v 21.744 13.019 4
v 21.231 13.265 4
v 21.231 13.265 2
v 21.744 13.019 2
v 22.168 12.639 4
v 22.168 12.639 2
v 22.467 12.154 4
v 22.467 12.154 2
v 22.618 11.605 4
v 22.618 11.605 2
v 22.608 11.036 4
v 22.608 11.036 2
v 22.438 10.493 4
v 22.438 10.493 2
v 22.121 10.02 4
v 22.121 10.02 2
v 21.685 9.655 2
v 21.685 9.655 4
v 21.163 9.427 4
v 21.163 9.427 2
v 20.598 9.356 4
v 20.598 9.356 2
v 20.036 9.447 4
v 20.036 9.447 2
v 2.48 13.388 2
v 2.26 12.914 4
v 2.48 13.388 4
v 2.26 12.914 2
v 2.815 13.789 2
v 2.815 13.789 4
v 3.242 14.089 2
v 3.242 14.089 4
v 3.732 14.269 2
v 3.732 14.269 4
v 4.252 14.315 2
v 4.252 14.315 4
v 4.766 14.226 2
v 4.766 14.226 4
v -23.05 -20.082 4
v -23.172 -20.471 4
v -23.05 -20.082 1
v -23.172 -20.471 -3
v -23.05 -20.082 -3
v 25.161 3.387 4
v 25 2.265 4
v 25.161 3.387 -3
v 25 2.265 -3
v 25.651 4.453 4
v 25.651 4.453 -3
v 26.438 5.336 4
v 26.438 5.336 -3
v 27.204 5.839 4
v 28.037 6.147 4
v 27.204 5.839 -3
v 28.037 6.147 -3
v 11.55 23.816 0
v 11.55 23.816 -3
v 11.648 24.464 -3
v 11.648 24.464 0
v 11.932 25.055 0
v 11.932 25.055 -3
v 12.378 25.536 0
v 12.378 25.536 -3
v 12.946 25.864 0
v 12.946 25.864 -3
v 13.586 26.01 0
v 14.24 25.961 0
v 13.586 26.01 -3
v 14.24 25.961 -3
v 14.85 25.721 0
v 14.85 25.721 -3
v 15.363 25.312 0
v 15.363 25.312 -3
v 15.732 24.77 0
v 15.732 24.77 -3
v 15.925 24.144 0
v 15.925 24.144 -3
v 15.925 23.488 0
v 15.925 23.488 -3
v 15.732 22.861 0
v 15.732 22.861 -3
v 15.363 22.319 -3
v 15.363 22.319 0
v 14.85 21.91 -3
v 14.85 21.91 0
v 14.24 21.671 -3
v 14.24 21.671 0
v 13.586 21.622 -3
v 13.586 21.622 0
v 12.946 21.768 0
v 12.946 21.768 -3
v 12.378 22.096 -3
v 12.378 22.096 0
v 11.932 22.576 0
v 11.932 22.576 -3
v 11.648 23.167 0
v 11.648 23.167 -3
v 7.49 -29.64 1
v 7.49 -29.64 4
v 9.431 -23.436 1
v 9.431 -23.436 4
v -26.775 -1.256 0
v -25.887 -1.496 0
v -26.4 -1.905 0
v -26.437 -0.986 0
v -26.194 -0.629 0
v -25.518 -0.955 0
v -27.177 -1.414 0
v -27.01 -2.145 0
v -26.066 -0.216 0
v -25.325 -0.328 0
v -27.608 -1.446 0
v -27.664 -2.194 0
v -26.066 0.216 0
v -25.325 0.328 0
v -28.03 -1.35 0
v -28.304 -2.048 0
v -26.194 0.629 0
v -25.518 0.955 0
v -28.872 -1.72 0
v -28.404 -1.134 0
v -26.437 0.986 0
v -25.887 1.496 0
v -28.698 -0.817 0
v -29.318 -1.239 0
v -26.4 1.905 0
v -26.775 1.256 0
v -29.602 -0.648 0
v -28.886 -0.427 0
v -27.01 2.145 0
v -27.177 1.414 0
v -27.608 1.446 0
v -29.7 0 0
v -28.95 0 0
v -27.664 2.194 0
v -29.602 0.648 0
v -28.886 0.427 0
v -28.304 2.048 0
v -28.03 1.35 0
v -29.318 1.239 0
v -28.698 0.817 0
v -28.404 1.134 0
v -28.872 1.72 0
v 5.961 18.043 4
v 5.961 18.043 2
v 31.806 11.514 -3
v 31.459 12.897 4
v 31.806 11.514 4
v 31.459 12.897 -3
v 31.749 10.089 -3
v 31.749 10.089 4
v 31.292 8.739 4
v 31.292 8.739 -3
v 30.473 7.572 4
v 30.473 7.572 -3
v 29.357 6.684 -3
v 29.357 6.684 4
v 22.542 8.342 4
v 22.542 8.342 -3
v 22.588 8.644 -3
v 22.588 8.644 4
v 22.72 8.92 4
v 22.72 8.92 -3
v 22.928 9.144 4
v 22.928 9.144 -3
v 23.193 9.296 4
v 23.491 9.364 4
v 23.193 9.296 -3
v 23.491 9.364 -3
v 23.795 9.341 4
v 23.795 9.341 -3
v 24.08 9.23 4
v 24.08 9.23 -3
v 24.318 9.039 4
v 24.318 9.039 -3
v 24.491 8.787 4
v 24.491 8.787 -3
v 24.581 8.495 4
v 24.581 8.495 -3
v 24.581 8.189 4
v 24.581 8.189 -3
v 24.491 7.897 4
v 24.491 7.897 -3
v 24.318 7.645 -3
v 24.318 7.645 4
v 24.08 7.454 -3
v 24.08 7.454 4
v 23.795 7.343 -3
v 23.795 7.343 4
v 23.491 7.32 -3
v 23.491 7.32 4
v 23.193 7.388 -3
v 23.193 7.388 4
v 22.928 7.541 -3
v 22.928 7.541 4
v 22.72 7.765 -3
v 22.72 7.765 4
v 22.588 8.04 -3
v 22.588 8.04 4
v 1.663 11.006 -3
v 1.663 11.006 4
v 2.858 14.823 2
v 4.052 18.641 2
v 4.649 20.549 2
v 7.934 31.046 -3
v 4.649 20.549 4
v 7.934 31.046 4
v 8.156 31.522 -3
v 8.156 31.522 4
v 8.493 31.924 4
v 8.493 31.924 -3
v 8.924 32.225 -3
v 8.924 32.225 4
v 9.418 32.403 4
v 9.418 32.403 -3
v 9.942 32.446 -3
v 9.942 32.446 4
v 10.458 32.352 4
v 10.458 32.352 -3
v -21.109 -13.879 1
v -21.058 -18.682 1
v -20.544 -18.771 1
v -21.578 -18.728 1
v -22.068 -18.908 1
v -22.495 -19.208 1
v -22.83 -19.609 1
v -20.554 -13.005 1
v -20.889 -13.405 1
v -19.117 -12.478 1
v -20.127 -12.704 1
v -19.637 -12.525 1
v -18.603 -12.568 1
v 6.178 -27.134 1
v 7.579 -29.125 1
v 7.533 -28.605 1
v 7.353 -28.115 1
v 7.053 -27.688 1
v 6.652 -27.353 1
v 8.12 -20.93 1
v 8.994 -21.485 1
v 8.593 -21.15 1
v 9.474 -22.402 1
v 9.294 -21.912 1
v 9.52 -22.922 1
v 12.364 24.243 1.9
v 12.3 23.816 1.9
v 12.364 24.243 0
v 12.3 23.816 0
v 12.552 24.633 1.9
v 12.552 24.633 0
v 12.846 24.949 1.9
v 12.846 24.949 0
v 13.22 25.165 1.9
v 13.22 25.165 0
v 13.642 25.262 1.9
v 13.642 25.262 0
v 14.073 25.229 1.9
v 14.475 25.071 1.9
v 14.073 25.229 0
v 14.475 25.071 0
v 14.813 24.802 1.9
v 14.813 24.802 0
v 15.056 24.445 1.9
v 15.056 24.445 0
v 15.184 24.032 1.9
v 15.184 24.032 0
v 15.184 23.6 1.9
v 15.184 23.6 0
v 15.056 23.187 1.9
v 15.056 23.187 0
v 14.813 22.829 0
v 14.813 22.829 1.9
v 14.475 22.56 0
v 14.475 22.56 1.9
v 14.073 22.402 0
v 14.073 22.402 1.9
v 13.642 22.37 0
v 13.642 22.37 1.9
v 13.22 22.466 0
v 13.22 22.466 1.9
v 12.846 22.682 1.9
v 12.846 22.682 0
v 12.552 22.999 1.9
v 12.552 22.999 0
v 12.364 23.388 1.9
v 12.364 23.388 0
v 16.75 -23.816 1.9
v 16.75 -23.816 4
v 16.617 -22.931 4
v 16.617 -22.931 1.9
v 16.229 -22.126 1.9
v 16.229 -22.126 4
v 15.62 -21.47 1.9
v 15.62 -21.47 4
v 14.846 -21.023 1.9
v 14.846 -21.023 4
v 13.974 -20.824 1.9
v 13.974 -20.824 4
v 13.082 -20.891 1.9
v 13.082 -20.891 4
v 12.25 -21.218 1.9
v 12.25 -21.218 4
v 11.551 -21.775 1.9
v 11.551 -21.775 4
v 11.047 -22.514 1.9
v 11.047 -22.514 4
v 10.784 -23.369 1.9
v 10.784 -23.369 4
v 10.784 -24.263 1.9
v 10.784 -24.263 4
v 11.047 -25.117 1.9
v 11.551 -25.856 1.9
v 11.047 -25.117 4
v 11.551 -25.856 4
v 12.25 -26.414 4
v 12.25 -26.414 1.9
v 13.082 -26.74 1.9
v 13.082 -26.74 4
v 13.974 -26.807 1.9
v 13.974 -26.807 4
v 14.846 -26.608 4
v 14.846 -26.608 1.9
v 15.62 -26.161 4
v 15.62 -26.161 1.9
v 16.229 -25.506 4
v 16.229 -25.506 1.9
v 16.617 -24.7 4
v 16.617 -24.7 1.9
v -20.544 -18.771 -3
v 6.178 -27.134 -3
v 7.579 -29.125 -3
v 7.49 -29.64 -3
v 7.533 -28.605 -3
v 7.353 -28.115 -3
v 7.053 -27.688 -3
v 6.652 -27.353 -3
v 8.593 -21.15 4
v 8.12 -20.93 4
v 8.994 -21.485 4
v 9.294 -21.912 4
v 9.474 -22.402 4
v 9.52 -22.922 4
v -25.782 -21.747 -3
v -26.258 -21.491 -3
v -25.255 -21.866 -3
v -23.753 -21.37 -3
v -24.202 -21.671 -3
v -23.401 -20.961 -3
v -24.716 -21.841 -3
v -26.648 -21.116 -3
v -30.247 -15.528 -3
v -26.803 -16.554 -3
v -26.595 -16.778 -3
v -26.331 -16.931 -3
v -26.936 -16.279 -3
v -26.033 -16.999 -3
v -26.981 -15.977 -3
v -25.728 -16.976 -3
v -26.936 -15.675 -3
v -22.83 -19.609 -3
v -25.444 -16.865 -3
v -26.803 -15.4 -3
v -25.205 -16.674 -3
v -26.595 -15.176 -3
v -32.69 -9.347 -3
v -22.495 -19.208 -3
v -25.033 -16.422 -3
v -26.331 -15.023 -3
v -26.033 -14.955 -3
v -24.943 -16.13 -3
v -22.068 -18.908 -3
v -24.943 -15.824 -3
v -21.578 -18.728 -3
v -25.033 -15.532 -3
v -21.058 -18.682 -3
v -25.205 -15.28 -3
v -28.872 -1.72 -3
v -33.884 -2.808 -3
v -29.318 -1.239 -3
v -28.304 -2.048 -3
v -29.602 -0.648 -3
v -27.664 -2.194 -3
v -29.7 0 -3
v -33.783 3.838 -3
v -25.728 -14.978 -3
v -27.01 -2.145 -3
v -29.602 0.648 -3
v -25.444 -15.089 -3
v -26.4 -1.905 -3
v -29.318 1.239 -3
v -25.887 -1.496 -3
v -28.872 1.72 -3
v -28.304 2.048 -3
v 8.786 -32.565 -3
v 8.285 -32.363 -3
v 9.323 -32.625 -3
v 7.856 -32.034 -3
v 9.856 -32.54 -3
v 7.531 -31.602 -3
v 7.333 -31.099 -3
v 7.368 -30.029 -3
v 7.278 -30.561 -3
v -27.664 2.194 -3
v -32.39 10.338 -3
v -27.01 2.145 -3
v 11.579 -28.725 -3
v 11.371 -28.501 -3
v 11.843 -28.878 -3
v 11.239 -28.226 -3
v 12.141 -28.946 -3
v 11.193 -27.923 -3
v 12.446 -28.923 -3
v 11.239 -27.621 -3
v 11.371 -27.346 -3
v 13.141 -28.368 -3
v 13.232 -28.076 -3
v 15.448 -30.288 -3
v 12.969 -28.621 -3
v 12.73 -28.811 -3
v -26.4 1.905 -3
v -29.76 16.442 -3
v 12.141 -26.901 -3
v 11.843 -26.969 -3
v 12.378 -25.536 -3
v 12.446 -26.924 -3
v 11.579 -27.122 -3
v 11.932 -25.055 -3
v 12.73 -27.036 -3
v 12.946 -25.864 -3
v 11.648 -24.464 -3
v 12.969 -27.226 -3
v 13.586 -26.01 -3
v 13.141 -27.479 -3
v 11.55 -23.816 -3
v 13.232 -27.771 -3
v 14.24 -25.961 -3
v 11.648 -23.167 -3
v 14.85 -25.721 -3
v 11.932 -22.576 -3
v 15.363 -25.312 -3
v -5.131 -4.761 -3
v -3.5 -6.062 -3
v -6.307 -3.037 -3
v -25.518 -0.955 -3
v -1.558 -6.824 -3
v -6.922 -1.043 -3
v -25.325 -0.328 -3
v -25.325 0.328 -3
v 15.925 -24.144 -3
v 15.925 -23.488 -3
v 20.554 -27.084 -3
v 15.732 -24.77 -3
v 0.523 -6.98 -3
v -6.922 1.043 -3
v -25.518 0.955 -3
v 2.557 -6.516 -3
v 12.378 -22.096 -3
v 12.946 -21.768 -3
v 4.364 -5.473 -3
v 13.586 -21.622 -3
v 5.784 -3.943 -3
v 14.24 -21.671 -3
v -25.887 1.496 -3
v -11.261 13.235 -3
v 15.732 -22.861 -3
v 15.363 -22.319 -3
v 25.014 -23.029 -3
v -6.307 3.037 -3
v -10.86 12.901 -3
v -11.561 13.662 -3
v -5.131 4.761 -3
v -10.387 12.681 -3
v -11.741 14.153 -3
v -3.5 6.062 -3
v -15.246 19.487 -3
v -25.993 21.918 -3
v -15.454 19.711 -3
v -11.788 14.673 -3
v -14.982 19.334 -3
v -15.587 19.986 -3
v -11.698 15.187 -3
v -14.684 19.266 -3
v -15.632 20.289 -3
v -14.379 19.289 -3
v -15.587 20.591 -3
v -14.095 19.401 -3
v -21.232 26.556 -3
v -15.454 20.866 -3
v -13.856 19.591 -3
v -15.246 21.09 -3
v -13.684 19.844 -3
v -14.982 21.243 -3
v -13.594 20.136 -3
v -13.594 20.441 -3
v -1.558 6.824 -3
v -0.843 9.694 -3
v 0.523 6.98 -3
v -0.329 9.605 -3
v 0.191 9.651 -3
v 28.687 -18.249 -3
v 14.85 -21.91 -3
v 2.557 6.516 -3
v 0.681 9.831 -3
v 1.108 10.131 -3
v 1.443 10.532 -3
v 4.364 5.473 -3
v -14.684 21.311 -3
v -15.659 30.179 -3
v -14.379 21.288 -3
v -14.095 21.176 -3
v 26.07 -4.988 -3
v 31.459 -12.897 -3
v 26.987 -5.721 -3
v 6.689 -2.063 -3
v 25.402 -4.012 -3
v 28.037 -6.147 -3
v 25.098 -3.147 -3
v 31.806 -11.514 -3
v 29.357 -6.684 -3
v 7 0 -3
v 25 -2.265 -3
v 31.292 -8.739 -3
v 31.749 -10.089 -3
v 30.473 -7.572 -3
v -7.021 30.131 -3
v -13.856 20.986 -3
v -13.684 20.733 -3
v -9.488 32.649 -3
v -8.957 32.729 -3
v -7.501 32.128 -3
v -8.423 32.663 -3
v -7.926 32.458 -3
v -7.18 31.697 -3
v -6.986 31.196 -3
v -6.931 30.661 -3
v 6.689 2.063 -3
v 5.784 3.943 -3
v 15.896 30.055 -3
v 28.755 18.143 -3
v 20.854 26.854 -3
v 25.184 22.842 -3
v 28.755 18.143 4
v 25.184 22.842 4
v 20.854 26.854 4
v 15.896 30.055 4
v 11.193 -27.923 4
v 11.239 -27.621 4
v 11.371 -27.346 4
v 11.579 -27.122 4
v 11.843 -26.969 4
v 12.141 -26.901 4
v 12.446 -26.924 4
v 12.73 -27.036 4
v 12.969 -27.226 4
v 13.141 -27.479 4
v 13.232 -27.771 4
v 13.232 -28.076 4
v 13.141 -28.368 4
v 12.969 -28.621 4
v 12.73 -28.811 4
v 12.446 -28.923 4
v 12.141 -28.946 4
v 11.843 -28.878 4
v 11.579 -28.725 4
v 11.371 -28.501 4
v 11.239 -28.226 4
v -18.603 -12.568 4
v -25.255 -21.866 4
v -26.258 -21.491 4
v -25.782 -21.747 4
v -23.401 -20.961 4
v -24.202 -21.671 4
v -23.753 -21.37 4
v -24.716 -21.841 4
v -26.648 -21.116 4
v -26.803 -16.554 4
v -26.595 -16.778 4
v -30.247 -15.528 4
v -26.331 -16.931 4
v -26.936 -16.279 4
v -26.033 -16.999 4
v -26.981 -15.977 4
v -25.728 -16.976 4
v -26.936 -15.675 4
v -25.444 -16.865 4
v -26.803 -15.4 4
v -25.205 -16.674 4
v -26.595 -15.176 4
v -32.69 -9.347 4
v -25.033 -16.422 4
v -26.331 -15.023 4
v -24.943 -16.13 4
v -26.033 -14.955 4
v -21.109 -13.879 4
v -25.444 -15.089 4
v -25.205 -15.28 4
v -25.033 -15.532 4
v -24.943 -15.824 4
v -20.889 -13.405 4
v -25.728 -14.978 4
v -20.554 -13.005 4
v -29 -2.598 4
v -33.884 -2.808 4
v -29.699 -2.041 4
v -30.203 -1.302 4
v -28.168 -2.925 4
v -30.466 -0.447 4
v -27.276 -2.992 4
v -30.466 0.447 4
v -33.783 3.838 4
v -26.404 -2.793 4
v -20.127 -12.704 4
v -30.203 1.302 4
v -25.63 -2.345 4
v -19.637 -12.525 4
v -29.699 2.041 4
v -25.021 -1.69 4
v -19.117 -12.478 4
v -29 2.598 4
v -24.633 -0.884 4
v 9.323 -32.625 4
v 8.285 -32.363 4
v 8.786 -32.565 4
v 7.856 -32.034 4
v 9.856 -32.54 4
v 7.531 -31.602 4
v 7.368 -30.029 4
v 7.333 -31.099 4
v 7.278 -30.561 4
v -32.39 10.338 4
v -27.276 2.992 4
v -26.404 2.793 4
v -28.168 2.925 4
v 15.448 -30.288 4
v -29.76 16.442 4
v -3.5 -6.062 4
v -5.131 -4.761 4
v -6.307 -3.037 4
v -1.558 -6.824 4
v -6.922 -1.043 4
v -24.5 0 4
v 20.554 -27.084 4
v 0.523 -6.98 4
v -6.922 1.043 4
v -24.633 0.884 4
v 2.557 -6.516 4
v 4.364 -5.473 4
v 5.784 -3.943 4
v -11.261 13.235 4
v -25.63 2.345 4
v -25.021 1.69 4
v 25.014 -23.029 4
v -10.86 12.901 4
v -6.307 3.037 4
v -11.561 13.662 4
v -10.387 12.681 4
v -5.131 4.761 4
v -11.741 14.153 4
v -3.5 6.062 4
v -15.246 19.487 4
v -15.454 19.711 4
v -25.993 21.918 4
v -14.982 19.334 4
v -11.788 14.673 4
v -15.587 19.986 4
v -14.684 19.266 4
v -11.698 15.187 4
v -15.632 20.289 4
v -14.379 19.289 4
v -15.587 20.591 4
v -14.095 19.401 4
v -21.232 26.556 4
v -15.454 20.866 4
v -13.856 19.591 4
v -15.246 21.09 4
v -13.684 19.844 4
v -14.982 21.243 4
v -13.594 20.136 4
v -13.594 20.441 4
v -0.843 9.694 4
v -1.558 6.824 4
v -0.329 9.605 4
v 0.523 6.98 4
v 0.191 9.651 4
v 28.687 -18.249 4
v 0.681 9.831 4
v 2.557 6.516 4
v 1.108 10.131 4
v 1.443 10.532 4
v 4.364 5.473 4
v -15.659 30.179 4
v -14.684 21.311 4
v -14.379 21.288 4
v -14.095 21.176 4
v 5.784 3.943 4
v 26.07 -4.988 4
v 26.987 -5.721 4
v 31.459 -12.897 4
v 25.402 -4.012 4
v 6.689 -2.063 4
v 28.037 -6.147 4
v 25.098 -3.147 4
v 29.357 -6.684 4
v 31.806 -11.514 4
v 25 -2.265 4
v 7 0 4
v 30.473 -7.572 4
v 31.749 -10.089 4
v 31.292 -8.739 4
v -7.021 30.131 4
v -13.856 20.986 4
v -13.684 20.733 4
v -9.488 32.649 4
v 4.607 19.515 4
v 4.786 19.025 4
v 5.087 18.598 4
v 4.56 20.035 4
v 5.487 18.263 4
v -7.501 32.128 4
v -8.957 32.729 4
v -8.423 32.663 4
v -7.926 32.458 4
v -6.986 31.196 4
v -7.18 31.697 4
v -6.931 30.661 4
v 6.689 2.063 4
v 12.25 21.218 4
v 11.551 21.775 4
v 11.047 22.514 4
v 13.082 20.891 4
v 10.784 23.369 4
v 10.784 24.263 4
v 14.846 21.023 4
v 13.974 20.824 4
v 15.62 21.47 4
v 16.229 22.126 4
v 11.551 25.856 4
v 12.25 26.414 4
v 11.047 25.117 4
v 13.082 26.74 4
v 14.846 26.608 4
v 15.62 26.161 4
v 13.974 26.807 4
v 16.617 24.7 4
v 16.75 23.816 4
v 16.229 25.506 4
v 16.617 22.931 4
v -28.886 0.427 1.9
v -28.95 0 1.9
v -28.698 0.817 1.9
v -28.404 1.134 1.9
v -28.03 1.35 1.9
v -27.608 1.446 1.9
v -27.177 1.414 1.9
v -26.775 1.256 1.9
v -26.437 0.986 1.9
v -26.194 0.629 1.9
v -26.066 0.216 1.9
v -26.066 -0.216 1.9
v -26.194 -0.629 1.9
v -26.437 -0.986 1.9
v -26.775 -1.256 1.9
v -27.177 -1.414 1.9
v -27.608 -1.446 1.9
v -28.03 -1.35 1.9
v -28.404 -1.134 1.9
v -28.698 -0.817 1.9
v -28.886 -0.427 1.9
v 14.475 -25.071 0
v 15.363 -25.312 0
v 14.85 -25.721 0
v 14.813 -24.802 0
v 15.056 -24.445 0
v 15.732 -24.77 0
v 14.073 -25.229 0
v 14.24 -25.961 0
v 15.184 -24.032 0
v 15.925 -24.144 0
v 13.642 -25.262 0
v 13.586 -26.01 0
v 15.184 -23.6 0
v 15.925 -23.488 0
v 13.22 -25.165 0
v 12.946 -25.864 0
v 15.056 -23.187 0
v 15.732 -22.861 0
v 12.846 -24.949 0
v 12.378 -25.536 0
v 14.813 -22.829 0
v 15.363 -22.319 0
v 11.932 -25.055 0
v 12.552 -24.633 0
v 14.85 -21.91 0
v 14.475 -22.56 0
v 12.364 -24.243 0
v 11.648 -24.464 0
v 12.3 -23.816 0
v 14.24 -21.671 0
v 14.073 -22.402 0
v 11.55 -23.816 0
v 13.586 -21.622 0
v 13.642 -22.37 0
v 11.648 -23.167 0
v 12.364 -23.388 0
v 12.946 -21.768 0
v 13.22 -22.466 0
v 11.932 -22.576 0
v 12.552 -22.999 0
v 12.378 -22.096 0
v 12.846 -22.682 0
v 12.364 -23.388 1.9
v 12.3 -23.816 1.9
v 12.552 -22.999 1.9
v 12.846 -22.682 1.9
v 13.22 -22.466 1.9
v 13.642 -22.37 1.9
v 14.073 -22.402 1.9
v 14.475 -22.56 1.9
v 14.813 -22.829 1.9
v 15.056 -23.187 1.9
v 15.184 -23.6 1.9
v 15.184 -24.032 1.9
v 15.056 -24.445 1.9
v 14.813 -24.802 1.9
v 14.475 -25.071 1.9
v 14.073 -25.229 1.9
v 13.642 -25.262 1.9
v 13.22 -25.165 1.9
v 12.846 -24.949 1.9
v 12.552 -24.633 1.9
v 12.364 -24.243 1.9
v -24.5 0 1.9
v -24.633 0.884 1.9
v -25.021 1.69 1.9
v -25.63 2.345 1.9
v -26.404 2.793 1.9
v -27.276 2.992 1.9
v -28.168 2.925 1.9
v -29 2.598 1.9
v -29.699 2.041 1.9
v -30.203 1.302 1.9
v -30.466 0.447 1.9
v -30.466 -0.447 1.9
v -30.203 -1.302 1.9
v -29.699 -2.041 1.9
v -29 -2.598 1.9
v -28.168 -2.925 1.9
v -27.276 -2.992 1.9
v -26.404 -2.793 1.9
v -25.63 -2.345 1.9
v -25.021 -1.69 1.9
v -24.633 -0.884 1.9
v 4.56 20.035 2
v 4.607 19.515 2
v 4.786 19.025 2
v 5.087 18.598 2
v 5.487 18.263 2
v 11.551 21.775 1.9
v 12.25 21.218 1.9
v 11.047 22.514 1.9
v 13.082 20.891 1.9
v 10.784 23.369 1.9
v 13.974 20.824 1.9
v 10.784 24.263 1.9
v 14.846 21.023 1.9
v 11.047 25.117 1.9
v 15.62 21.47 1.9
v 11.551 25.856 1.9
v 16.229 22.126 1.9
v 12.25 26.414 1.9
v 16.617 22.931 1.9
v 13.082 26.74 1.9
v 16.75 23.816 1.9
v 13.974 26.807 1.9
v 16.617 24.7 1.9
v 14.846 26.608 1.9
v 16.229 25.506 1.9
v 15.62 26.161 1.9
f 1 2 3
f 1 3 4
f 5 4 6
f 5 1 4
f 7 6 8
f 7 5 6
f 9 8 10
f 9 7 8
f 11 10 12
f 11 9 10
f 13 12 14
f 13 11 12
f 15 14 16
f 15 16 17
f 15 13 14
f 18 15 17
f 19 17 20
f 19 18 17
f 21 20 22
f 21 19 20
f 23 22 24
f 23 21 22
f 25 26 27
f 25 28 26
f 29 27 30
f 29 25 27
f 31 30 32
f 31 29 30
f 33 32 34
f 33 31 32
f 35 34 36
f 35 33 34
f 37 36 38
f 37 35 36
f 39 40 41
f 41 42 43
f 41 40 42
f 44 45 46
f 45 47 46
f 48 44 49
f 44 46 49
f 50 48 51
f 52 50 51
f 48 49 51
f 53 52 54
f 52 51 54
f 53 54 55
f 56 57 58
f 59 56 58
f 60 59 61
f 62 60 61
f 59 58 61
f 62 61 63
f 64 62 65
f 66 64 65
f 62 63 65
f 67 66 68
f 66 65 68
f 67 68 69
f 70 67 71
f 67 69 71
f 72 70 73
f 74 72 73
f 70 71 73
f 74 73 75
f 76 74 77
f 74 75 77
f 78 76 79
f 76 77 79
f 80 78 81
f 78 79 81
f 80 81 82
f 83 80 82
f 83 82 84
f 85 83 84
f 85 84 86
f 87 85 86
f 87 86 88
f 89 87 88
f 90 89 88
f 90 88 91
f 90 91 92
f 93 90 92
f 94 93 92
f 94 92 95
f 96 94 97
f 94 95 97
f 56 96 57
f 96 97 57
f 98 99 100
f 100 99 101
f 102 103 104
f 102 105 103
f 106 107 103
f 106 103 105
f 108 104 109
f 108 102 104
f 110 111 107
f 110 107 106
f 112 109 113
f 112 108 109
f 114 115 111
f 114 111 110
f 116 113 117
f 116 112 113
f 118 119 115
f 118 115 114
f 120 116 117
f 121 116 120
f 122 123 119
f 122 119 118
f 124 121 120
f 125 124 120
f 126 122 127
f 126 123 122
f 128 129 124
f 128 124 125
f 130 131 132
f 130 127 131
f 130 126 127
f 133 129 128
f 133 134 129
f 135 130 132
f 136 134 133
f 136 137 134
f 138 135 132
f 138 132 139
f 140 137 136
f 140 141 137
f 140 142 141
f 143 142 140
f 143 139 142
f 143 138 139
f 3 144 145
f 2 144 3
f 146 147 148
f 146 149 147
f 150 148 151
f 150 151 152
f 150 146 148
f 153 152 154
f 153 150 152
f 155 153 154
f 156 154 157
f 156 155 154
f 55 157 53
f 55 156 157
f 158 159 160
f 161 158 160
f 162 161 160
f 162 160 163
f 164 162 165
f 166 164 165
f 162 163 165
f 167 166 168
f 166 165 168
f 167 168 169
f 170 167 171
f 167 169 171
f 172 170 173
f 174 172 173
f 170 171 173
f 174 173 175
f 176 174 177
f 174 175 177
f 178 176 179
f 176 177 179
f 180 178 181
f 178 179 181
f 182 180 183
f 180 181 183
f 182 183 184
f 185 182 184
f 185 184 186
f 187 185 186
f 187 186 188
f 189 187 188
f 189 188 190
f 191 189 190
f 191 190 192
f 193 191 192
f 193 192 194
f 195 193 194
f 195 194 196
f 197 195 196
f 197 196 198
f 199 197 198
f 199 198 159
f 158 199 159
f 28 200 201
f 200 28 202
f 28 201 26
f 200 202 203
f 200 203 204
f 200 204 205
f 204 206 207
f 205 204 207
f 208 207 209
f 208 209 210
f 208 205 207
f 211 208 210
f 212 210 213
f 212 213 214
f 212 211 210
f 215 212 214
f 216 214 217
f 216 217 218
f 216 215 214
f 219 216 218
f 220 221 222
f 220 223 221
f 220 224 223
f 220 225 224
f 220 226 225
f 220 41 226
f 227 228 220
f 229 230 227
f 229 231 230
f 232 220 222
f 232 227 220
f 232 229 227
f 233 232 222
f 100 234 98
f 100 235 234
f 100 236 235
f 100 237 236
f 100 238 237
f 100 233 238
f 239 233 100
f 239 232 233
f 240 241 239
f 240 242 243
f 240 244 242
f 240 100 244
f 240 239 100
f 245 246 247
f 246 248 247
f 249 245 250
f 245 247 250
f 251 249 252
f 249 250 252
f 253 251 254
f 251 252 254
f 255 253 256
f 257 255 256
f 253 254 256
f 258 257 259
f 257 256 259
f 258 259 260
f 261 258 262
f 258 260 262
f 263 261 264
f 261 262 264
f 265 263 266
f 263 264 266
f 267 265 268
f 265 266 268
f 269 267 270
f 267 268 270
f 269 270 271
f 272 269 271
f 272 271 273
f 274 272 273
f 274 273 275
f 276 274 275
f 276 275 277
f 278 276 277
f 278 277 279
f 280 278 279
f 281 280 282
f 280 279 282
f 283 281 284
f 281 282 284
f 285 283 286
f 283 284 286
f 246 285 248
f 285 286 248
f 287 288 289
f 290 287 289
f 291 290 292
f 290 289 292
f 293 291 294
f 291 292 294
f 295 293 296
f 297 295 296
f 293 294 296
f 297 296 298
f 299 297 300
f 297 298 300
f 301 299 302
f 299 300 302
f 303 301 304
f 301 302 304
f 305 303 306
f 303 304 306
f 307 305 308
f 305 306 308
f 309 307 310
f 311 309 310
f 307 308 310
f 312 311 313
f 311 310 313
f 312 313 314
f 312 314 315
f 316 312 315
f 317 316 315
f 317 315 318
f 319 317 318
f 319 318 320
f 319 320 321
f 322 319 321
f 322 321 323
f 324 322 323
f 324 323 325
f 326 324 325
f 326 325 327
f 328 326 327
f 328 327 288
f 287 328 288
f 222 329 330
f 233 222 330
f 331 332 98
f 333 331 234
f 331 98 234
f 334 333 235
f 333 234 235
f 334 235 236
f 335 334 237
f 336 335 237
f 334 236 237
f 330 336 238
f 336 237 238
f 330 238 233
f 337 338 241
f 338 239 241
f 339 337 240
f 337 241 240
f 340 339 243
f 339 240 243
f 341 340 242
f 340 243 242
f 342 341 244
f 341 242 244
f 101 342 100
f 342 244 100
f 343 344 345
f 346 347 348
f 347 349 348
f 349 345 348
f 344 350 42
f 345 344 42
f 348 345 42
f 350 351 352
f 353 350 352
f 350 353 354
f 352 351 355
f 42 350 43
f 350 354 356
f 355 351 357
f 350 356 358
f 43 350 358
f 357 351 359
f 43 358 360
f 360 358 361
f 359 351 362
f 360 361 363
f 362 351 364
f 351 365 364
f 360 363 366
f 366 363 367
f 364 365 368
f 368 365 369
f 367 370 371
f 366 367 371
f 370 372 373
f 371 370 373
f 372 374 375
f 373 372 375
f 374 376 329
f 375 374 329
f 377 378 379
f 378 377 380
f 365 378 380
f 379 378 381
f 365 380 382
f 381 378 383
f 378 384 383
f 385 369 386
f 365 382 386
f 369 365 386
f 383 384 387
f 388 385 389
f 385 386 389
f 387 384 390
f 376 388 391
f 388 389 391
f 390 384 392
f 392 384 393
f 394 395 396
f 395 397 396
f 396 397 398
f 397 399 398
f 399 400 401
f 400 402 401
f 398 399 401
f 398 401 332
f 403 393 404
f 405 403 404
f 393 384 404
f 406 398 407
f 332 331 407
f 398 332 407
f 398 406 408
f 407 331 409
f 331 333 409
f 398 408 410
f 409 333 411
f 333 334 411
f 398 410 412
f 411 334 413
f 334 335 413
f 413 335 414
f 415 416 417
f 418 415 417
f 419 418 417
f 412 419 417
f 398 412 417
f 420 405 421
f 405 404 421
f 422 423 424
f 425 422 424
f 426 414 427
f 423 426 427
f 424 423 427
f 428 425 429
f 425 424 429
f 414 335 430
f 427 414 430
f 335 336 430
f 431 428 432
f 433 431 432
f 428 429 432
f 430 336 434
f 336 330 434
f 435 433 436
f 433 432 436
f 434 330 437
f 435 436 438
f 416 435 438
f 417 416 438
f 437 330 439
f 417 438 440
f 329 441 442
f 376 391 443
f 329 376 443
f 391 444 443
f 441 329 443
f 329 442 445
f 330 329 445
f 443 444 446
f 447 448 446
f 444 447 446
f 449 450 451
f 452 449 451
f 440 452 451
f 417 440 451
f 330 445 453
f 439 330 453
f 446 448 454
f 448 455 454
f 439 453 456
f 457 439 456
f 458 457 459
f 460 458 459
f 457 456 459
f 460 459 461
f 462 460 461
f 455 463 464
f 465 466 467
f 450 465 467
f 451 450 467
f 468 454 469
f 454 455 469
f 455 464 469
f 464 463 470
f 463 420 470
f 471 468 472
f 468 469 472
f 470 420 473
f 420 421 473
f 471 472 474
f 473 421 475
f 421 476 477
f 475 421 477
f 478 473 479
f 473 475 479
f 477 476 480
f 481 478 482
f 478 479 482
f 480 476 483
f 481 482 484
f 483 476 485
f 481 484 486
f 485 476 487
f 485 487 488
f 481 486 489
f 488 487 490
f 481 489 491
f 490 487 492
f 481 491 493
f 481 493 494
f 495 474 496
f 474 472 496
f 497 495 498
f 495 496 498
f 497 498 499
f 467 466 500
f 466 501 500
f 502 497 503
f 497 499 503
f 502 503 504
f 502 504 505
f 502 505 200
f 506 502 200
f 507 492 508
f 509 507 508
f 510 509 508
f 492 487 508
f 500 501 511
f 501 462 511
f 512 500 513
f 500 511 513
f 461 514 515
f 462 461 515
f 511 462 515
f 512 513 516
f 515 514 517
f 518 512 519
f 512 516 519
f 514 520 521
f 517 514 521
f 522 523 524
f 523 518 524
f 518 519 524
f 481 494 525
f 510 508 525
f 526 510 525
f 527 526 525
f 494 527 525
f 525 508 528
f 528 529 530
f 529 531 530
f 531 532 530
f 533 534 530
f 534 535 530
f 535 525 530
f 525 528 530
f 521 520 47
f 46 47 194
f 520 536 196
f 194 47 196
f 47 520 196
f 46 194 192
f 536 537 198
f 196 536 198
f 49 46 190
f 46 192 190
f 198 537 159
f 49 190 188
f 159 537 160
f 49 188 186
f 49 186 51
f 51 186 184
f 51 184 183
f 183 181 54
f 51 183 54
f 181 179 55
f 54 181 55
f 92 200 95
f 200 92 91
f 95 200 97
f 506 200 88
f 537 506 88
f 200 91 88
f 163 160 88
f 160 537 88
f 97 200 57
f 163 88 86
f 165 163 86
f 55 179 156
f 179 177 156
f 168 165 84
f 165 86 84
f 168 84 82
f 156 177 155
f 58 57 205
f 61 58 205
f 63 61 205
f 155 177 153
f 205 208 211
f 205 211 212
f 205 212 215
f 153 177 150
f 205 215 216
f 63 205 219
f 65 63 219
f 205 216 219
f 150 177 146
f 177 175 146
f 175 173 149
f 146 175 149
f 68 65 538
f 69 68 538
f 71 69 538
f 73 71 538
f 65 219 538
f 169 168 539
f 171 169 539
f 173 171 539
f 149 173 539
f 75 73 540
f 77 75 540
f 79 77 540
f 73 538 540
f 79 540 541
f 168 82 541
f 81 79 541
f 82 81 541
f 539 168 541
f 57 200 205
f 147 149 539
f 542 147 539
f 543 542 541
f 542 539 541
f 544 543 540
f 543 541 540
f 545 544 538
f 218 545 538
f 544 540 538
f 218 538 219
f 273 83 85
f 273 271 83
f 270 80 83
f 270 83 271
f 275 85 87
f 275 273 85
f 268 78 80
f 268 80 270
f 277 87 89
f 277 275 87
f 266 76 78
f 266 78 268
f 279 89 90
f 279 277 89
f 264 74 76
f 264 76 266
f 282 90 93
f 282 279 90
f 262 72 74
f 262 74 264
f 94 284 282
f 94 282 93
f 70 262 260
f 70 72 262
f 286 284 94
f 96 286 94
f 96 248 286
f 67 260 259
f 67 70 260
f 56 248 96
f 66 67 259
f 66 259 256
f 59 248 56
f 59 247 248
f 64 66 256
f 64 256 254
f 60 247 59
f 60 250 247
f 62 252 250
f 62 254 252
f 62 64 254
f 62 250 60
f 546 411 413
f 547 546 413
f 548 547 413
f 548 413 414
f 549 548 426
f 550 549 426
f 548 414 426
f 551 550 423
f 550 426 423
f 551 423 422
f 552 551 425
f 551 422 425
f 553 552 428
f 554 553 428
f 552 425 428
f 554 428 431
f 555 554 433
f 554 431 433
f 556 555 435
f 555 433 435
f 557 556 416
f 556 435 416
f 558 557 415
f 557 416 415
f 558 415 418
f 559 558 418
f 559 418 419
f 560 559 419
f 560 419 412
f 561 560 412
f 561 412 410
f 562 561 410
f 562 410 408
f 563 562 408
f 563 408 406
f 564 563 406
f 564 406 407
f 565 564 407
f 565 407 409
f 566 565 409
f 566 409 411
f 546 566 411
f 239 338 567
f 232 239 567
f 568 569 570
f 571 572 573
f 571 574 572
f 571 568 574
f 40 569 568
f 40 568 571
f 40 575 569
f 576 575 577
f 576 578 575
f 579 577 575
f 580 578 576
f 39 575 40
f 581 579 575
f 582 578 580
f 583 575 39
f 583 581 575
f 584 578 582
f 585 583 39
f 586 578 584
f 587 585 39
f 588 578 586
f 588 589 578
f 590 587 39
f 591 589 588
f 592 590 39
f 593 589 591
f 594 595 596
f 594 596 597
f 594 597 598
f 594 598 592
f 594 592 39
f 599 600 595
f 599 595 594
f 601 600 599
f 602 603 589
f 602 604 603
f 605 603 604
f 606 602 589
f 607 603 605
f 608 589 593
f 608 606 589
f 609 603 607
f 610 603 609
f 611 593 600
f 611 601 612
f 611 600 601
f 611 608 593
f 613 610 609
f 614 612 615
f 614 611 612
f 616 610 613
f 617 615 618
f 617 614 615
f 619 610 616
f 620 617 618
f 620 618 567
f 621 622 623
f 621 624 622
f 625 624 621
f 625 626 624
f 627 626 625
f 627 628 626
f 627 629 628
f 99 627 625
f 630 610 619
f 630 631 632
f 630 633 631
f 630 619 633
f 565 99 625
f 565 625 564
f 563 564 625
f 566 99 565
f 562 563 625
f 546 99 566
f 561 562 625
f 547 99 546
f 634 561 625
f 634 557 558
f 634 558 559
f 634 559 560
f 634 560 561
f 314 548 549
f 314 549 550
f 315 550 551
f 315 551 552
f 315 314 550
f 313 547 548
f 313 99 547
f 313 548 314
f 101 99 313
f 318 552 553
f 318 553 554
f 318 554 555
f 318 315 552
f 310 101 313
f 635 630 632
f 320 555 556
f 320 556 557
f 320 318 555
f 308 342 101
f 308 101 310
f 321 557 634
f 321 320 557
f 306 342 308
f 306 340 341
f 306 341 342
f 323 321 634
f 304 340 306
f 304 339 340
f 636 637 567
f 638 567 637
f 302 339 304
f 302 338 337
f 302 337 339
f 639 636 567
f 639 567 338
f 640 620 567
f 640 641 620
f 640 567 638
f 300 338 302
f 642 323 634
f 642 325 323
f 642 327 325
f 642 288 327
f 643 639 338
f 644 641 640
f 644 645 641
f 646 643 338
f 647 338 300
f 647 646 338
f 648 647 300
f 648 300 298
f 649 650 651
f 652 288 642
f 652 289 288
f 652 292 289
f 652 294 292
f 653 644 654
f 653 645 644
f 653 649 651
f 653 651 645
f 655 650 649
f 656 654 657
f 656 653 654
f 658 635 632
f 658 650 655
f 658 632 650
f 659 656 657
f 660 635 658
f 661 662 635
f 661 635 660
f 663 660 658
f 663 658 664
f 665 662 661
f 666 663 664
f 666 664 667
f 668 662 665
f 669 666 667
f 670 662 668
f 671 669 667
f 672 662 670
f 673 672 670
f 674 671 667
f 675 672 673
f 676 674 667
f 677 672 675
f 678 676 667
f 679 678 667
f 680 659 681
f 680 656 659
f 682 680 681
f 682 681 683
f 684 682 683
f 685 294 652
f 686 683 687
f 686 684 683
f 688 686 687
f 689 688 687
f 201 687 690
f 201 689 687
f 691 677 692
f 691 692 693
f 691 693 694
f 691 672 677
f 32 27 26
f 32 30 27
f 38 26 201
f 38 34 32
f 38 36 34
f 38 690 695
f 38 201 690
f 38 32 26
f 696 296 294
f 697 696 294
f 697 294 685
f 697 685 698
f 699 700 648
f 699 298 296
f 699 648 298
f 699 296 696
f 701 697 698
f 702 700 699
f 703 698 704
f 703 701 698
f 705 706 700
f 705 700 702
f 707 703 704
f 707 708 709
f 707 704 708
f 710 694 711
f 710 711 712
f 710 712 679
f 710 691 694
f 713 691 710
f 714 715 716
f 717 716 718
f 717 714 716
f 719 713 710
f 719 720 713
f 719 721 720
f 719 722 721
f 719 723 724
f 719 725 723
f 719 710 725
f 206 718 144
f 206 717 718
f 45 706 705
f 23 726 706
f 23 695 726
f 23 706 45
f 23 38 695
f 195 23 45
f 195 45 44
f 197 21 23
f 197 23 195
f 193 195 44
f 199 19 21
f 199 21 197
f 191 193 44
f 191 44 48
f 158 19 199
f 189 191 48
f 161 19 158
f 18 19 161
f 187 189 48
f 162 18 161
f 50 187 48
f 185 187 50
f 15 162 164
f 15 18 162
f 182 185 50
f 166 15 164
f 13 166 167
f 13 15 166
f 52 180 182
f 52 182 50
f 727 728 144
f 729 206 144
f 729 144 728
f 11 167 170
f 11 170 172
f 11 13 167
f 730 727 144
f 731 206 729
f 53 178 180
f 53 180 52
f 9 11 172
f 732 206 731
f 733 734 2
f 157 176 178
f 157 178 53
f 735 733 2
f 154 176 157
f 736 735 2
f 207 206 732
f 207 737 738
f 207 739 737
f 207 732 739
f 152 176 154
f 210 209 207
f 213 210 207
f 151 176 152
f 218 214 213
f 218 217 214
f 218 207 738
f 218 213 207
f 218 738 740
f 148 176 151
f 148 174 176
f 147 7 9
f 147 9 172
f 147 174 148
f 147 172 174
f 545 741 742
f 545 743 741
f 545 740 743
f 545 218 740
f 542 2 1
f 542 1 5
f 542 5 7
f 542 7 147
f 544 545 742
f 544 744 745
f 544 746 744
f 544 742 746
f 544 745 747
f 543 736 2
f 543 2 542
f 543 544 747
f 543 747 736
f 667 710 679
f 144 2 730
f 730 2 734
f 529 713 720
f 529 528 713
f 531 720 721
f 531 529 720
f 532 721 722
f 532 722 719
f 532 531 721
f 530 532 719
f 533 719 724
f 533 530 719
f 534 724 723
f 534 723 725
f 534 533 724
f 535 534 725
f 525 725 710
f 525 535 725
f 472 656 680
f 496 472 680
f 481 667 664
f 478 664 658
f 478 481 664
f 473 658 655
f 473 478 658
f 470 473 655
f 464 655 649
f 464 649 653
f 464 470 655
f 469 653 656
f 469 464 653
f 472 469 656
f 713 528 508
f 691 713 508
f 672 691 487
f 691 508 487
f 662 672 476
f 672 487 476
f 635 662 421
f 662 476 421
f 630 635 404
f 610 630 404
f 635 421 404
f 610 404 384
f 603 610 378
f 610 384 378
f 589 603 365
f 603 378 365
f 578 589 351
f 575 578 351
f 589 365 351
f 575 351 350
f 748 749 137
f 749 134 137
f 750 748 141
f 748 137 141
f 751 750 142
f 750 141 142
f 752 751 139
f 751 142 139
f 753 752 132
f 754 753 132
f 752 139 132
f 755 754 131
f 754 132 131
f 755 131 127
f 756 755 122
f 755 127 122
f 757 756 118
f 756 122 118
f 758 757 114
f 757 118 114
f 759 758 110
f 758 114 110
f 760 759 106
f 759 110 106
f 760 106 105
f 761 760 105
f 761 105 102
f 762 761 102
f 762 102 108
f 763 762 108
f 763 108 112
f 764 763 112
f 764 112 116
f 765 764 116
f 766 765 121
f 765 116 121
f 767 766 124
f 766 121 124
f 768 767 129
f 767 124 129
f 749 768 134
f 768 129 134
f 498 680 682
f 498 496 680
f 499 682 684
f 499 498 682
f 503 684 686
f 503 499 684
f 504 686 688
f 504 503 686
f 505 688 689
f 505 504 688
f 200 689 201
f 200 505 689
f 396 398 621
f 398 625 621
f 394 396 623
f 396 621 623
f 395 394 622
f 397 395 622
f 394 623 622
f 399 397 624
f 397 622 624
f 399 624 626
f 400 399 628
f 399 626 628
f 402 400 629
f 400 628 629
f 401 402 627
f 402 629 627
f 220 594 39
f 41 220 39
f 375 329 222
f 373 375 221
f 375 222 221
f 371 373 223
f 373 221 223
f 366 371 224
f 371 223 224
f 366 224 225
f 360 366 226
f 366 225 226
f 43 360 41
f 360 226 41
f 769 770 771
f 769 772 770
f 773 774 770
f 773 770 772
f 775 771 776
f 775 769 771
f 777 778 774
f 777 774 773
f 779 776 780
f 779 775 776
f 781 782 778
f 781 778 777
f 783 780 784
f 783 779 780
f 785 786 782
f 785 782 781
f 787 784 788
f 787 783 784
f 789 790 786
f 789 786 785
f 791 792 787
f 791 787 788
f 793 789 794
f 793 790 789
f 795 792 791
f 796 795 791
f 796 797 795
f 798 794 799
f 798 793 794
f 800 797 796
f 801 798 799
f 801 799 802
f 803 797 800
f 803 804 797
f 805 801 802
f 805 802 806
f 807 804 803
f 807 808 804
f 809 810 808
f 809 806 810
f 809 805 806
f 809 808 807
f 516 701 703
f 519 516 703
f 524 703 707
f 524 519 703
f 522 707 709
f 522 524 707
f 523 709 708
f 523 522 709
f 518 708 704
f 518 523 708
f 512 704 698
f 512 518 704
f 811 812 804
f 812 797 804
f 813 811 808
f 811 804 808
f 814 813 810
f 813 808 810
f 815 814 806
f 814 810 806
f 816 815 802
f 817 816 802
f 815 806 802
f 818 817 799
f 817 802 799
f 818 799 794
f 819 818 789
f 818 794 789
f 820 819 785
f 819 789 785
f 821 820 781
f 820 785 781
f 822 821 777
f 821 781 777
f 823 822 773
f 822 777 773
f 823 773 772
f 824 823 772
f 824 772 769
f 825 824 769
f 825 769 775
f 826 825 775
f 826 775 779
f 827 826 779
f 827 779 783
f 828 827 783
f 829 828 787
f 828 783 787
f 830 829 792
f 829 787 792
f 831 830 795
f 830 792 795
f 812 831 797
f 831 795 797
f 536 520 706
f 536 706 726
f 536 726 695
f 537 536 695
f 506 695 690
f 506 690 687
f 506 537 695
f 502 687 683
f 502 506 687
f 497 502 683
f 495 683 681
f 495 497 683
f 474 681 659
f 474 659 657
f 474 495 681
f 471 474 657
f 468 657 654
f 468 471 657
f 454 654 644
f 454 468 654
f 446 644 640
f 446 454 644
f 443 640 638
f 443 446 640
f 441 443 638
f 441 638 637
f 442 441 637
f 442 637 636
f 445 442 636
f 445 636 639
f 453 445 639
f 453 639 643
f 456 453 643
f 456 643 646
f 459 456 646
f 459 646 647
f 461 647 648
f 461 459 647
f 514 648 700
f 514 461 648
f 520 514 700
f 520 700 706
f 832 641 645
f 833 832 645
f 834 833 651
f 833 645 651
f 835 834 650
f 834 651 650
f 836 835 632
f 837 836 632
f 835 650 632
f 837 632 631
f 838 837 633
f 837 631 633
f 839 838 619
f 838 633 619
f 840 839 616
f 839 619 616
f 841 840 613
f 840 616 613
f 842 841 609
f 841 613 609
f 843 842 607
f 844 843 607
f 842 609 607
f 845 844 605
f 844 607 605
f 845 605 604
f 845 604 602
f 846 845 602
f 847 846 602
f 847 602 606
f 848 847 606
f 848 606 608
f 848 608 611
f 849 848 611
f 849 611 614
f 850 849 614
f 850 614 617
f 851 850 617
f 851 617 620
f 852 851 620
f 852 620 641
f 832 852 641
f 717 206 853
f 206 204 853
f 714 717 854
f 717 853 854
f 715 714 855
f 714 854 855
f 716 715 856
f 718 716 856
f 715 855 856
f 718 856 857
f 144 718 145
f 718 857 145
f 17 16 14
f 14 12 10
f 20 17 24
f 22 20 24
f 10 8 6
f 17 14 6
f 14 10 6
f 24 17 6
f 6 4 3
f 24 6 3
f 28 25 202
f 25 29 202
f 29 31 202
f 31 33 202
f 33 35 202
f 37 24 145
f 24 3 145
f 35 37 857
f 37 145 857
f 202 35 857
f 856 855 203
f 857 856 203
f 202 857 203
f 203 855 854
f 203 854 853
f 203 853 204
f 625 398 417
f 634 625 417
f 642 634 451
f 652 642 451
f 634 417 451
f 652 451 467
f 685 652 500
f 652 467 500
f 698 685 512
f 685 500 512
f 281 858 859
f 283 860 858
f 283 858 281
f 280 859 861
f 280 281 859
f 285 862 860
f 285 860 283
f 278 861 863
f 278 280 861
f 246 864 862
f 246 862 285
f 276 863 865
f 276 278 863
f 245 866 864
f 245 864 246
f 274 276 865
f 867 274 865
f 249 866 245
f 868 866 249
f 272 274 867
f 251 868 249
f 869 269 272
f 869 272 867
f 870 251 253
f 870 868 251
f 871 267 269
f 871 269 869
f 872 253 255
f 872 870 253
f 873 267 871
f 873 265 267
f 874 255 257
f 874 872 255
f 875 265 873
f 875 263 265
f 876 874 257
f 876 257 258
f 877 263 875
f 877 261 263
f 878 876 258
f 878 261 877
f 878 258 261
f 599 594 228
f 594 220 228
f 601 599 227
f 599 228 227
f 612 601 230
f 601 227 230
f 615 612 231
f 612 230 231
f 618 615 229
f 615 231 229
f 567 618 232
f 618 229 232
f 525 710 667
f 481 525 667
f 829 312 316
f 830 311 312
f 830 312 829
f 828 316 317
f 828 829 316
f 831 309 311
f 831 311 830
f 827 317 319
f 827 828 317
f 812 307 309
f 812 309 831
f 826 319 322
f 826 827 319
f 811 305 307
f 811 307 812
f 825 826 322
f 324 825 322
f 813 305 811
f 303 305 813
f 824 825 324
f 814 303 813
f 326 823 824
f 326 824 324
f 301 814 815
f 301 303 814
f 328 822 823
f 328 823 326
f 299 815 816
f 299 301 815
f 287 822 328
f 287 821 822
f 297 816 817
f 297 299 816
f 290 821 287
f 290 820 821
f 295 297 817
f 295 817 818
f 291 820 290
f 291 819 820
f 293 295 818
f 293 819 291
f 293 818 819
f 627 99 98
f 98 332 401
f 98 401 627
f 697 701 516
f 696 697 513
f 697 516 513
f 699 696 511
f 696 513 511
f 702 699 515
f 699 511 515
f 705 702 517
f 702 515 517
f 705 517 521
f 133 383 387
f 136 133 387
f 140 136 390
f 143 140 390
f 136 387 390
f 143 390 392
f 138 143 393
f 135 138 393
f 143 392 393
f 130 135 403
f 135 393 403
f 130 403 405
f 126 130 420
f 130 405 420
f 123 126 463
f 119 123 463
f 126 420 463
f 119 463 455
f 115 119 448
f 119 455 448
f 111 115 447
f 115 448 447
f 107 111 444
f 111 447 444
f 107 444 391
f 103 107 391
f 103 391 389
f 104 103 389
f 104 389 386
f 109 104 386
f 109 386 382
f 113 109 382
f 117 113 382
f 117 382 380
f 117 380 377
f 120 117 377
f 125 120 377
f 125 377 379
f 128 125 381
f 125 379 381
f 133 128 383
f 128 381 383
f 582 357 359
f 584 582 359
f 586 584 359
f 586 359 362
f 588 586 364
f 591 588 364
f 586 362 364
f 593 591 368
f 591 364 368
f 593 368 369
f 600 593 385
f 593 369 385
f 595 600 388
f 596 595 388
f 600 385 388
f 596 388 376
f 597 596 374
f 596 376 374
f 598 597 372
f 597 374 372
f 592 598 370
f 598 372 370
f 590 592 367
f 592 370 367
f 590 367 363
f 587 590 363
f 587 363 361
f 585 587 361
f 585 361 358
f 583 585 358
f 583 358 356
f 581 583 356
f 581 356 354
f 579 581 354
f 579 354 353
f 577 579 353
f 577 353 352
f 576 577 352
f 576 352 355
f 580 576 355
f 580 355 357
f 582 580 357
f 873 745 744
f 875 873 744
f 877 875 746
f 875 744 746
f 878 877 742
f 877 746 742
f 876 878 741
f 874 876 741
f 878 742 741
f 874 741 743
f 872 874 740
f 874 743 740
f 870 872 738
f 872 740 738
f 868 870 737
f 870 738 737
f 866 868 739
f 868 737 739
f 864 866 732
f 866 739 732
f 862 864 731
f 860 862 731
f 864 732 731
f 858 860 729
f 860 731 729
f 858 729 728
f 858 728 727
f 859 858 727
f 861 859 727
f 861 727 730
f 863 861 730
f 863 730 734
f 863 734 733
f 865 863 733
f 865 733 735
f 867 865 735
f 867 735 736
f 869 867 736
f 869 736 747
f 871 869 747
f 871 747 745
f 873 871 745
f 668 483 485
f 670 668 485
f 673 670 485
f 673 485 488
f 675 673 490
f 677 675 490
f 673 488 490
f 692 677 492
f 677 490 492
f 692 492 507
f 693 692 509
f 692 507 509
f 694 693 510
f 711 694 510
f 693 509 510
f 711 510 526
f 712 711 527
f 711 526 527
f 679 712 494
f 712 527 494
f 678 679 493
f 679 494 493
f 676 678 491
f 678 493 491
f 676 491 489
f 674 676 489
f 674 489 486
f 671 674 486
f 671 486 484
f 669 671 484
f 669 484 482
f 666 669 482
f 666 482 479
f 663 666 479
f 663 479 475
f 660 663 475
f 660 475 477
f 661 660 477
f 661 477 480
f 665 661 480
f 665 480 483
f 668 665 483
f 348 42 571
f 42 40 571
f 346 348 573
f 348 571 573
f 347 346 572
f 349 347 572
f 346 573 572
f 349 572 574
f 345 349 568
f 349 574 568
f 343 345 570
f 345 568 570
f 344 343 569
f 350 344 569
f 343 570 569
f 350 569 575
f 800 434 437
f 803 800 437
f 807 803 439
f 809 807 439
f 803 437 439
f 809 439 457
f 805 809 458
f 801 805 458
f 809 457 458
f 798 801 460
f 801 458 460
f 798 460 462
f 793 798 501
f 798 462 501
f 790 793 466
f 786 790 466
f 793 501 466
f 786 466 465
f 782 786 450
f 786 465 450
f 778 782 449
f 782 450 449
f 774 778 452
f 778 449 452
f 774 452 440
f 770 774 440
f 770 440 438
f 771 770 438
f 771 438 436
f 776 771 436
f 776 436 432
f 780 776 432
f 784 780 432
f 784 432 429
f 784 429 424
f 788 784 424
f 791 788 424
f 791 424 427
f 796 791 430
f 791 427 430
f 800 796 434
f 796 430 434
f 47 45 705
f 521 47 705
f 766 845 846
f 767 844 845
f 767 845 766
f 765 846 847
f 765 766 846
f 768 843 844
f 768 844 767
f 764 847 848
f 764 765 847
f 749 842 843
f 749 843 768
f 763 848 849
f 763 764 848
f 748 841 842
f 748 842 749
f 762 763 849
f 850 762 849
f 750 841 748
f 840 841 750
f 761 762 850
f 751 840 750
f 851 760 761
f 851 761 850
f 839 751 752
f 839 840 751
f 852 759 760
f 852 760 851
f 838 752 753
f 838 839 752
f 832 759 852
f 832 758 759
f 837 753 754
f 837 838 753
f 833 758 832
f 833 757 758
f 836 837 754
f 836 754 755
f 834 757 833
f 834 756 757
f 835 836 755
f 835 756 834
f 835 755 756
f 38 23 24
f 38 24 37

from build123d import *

# Parameters (mm, degrees)
BOSS_EXTRUDE1_DEPTH                        = 4
BOSS_EXTRUDE1_DEPTH_BACK                   = 3
SKETCH1_R                                  = 34
SKETCH1_R_2                                = 1
SKETCH1_R_3                                = 7
CUT_EXTRUDE1_REACH                         = 50.59
CUT_EXTRUDE2_REACH                         = 50.744
FILLET1_R                                  = 5
FILLET2_R                                  = 4
M2_5X0_45_TAPPED_HOLE1_D                   = 2.05
CBORE_FOR_M2_5_PAN_HEAD_SCREW1_D           = 2.9
CBORE_FOR_M2_5_PAN_HEAD_SCREW1_DEPTH       = 7
CBORE_FOR_M2_5_PAN_HEAD_SCREW1_CBORE_D     = 6
CBORE_FOR_M2_5_PAN_HEAD_SCREW1_CBORE_DEPTH = 2.1
SKETCH13_R                                 = 2.2
CUT_EXTRUDE3_DEPTH                         = 3
CUT_EXTRUDE4_REACH                         = 50.59
FILLET3_R                                  = 2
CUT_EXTRUDE5_DEPTH                         = 3
FILLET4_R                                  = 2
CUT_EXTRUDE7_DEPTH                         = 2
FILLET5_R                                  = 2


with BuildPart() as part:
    # Sketch1 → Boss-Extrude1 (new, two sides: drawn at the far end of the back side and taken through both)
    with BuildSketch(Plane.XY.offset(-BOSS_EXTRUDE1_DEPTH_BACK)):
        Circle(SKETCH1_R)
        with Locations((-27.5, 0)):
            Circle(SKETCH1_R_2, mode=Mode.SUBTRACT)
        with Locations((13.75, 23.815698604)):
            Circle(SKETCH1_R_2, mode=Mode.SUBTRACT)
        with Locations((13.75, -23.815698604)):
            Circle(SKETCH1_R_2, mode=Mode.SUBTRACT)
        Circle(SKETCH1_R_3, mode=Mode.SUBTRACT)
    extrude(amount=BOSS_EXTRUDE1_DEPTH + BOSS_EXTRUDE1_DEPTH_BACK)

    # Sketch2 → Cut-Extrude1 (cut, up to next)
    with BuildSketch(Plane.XY.offset(4), mode=Mode.PRIVATE) as cut_extrude1_sk1:
        with BuildLine():
            Line((33.466401061, 6), (25, 6))
            Line((25, 6), (25, -6))
            Line((25, -6), (33.466401061, -6))
            ThreePointArc((33.466401061, -6), (34, 0), (33.466401061, 6))
        make_face()
    cut_extrude1_tool1 = extrude(cut_extrude1_sk1.sketch, amount=-CUT_EXTRUDE1_REACH, mode=Mode.PRIVATE) & part.part
    add(cut_extrude1_tool1.solids().sort_by_distance((29.412779, 0, 4))[0], mode=Mode.SUBTRACT)

    # Sketch4 → Cut-Extrude2 (cut, up to next)
    with BuildSketch(Plane.XY.offset(-4), mode=Mode.PRIVATE) as cut_extrude2_sk1:
        with BuildLine():
            Line((-24.229587732, -23.852192317), (-22.452552523, -18.173755396))
            Line((-22.452552523, -18.173755396), (8.086940161, -27.730919545))
            Line((8.086940161, -27.730919545), (6.309904952, -33.409356466))
            ThreePointArc((6.309904952, -33.409356466), (-10.154486908, -32.448210977), (-24.229587732, -23.852192317))
        make_face()
    cut_extrude2_tool1 = extrude(cut_extrude2_sk1.sketch, amount=CUT_EXTRUDE2_REACH, mode=Mode.PRIVATE) & part.part
    add(cut_extrude2_tool1.solids().sort_by_distance((-8.498569, -27.1568, -4))[0], mode=Mode.SUBTRACT)

    # Fillet1
    fillet1_edges = [part.edges().sort_by_distance(p)[0] for p in [
        (33.466401061, 6, 0.5),
        (33.466401061, -6, 0.5),
    ]]
    fillet(fillet1_edges, radius=FILLET1_R)

    # Fillet2
    fillet2_edges = [part.edges().sort_by_distance(p)[0] for p in [
        (25, -6, 0.5),
        (25, 6, 0.5),
    ]]
    fillet(fillet2_edges, radius=FILLET2_R)

    # M2.5x0.45 Tapped Hole1 (through all)
    with Locations(Plane.XY.offset(4)):
        with Locations((-25.95639466, -15.977032774), (12.217971196, -27.92348796), (23.567103623, 8.342159603), (-14.607262233, 20.288614789)):
            Hole(M2_5X0_45_TAPPED_HOLE1_D / 2)

    # CBORE for M2.5 Pan Head Screw1
    with Locations(Plane.XY.offset(4)):
        with Locations((-27.5, 0), (13.75, 23.815698604), (13.75, -23.815698604)):
            CounterBoreHole(CBORE_FOR_M2_5_PAN_HEAD_SCREW1_D / 2, CBORE_FOR_M2_5_PAN_HEAD_SCREW1_CBORE_D / 2, CBORE_FOR_M2_5_PAN_HEAD_SCREW1_CBORE_DEPTH, depth=CBORE_FOR_M2_5_PAN_HEAD_SCREW1_DEPTH)

    # Sketch13 → Cut-Extrude3 (cut)
    with BuildSketch(Plane(origin=(0, 0, -3), x_dir=(-1, 0, 0), z_dir=(0, 0, -1))):
        with Locations((-13.75, 23.815698604)):
            Circle(SKETCH13_R)
        with Locations((27.5, 0)):
            Circle(SKETCH13_R)
        with Locations((-13.75, -23.815698604)):
            Circle(SKETCH13_R)
    extrude(amount=-CUT_EXTRUDE3_DEPTH, mode=Mode.SUBTRACT)

    # Sketch14 → Cut-Extrude4 (cut, up to next)
    with BuildSketch(Plane.XY.offset(4), mode=Mode.PRIVATE) as cut_extrude4_sk1:
        with BuildLine():
            Line((-5.976383774, 33.47062648), (-12.295486181, 13.278215978))
            Line((-12.295486181, 13.278215978), (1.065541868, 9.096956663))
            Line((1.065541868, 9.096956663), (8.519375308, 32.915349677))
            ThreePointArc((8.519375308, 32.915349677), (1.301454789, 33.975082273), (-5.976383774, 33.47062648))
        make_face()
    cut_extrude4_tool1 = extrude(cut_extrude4_sk1.sketch, amount=-CUT_EXTRUDE4_REACH, mode=Mode.PRIVATE) & part.part
    add(cut_extrude4_tool1.solids().sort_by_distance((-1.905533, 22.418355, 4))[0], mode=Mode.SUBTRACT)

    # Fillet3
    fillet3_edges = [part.edges().sort_by_distance(p)[0] for p in [
        (-5.976383774, 33.47062648, 0.5),
        (8.519375308, 32.915349677, 0.5),
        (1.065541868, 9.096956663, 0.5),
        (-12.295486181, 13.278215978, 0.5),
        (-24.229587732, -23.852192317, 0.5),
        (6.309904952, -33.409356466, 0.5),
        (8.086940161, -27.730919545, 0.5),
        (-22.452552523, -18.173755396, 0.5),
    ]]
    fillet(fillet3_edges, radius=FILLET3_R)

    # Sketch15 → Cut-Extrude5 (cut)
    with BuildSketch(Plane.XY.offset(4)):
        Polygon((6.448401058, -32.966798325), (10.028239129, -21.527585094), (-20.511253555, -11.970420945), (-24.091091627, -23.409634176), align=None)
    extrude(amount=-CUT_EXTRUDE5_DEPTH, mode=Mode.SUBTRACT)

    # Fillet4
    fillet4_edges = [part.edges().sort_by_distance(p)[0] for p in [
        (10.028239129, -21.527585094, 2.5),
        (-20.511253555, -11.970420945, 2.5),
    ]]
    fillet(fillet4_edges, radius=FILLET4_R)

    # Sketch16 → Cut-Extrude7 (cut)
    with BuildSketch(Plane.XY.offset(4)):
        with BuildLine():
            Line((20.035974781, 9.447206707), (2.857510146, 14.823111541))
            Line((2.857510146, 14.823111541), (4.052155665, 18.640548127))
            Line((4.052155665, 18.640548127), (21.2306203, 13.264643293))
            ThreePointArc((21.2306203, 13.264643293), (22.542015833, 10.758602241), (20.035974781, 9.447206707))
        make_face()
    extrude(amount=-CUT_EXTRUDE7_DEPTH, mode=Mode.SUBTRACT)

    # Fillet5
    fillet5_edges = [part.edges().sort_by_distance(p)[0] for p in [
        (2.857510146, 14.823111541, 3),
        (4.052155665, 18.640548127, 3),
    ]]
    fillet(fillet5_edges, radius=FILLET5_R)


solid = part.part
